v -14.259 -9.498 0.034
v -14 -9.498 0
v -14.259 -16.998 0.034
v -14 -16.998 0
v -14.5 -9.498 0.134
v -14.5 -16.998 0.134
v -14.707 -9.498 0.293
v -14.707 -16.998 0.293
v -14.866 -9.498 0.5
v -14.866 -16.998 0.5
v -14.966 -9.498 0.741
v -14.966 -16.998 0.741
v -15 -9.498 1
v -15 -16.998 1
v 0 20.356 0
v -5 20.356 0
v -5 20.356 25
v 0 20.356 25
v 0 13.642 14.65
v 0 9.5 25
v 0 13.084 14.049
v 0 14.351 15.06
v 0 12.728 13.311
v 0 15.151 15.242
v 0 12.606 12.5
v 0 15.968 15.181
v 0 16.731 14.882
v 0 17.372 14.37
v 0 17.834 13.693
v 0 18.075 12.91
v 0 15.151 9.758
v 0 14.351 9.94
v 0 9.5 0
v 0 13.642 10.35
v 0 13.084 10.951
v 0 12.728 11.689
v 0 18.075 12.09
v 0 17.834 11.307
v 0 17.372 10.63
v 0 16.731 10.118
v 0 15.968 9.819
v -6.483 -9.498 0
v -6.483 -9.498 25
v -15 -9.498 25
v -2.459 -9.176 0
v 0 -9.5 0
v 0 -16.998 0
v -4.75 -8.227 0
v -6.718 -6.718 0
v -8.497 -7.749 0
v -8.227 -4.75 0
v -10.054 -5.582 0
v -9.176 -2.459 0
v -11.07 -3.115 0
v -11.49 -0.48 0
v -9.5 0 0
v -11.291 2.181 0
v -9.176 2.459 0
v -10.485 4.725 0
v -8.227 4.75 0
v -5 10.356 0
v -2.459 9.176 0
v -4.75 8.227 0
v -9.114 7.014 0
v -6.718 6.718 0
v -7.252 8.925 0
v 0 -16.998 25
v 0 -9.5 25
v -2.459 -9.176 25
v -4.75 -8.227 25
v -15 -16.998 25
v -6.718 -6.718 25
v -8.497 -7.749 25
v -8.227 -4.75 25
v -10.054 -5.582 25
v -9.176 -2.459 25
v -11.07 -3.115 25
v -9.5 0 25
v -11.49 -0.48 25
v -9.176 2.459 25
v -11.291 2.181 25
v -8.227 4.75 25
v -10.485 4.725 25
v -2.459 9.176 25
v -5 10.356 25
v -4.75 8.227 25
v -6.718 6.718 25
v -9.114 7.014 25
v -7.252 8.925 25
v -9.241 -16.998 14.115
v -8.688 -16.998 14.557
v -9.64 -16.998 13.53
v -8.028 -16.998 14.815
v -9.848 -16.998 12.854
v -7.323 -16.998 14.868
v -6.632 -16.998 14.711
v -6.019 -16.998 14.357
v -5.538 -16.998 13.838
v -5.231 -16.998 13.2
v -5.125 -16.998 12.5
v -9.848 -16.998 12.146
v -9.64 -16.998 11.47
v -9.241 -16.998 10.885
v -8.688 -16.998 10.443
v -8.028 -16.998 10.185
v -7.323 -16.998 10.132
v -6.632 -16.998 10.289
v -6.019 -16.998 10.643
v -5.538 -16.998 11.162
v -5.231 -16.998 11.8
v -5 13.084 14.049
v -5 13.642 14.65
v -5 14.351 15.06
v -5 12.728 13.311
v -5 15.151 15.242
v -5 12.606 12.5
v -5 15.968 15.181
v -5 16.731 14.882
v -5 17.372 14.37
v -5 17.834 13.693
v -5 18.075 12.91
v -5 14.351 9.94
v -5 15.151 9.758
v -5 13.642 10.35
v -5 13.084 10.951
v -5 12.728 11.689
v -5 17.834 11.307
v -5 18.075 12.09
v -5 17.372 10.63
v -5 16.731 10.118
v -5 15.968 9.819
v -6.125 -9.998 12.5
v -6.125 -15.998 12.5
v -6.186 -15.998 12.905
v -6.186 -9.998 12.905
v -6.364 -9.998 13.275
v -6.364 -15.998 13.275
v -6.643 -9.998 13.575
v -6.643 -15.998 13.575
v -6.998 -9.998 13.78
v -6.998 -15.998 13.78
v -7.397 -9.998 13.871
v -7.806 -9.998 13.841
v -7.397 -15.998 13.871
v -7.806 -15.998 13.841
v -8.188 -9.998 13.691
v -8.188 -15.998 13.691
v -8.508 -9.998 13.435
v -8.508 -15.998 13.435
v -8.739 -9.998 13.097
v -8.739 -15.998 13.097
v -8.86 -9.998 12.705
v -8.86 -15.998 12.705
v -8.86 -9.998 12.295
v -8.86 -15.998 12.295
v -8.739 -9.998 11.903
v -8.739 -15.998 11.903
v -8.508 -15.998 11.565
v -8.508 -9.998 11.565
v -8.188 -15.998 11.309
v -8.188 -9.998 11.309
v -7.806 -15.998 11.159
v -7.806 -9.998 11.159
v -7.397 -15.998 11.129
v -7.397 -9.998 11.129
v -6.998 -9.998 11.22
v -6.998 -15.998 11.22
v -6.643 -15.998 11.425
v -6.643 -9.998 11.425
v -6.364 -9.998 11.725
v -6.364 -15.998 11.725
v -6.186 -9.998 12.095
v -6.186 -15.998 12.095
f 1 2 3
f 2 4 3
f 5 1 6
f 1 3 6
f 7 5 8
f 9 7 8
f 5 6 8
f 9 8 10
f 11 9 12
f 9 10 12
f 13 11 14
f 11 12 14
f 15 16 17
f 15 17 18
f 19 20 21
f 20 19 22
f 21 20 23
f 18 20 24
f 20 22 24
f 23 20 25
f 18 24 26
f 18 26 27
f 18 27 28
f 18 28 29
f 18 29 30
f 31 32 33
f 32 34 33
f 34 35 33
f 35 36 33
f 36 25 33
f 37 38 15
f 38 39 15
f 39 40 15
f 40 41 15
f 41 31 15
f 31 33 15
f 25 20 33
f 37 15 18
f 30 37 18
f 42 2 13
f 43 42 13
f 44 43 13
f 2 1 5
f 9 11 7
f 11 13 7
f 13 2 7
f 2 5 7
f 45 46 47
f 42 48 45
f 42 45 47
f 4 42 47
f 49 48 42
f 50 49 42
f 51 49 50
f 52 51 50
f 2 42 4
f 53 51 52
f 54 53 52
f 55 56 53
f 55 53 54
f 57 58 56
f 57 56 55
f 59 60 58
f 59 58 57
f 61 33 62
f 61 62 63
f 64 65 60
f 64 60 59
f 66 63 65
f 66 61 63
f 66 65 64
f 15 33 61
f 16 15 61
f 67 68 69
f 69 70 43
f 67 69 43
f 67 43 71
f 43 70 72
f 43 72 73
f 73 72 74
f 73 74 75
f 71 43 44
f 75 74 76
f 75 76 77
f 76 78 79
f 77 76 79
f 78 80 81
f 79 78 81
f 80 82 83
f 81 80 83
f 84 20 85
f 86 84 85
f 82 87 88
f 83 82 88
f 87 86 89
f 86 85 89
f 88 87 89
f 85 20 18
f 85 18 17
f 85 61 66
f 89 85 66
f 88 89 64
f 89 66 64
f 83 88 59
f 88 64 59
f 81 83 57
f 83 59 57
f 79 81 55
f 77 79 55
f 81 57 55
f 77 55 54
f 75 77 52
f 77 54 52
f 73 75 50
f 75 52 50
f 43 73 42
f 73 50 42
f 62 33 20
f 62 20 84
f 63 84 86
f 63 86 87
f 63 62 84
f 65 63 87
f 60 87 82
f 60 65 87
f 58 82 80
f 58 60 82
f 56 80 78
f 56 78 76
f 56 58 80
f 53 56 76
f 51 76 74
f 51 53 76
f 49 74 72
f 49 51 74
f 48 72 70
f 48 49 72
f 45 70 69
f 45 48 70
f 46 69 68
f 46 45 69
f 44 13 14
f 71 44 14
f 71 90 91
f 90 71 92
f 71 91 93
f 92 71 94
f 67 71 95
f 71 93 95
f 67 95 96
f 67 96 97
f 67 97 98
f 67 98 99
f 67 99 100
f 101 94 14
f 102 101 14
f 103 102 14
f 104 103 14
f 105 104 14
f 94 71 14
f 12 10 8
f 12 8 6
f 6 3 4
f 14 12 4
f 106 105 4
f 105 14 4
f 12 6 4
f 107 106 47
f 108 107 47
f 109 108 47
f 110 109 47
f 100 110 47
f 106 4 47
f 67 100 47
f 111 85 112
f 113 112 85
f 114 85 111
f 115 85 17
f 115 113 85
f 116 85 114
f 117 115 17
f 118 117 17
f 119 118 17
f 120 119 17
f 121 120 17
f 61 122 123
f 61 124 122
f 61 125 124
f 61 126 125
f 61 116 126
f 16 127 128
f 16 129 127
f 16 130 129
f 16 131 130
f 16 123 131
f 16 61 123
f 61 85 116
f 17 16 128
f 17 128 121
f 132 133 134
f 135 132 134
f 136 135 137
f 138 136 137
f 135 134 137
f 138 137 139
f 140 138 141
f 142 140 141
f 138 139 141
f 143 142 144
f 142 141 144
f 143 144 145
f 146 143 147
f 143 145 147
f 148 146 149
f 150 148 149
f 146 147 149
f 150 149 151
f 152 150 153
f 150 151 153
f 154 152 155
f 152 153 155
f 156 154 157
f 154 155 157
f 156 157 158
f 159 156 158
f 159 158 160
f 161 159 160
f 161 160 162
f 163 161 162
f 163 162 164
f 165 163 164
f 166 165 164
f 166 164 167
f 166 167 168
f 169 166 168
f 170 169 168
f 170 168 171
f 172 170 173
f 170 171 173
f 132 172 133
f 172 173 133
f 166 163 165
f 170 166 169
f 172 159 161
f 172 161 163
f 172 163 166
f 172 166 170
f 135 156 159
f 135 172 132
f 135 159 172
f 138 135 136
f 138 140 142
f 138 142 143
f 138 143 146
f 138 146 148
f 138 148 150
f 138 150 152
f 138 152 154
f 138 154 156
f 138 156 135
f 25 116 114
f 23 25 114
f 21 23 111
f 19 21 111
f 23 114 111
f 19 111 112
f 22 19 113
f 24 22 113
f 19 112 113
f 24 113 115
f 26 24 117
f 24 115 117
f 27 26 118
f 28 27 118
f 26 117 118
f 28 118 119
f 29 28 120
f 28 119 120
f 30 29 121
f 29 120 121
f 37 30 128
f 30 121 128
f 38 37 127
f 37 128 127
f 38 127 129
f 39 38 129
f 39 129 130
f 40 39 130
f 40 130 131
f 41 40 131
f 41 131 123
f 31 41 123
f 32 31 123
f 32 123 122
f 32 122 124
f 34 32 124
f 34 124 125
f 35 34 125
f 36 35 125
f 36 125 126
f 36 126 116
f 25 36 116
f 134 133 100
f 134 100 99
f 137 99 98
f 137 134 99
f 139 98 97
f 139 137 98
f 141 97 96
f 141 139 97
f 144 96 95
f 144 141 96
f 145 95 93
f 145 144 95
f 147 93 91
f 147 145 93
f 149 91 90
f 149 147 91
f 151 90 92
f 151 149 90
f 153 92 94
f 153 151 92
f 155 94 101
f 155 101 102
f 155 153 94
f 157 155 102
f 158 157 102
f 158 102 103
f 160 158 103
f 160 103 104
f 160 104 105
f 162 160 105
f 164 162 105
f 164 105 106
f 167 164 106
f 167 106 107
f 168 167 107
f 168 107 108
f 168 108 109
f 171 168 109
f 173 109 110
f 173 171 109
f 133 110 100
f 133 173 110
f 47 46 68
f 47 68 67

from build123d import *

# Parameters (mm, degrees)
PAD004_DEPTH    = 25
SKETCH011_R     = 1.375
POCKET007_DEPTH = 7
SKETCH012_R     = 2.75
POCKET008_DEPTH = 7
FILLET012_R     = 1
CHAMFER001_SIZE = 1


with BuildPart() as part:
    # Sketch008 (on XY_Plane003 of Origin006) → Pad004 (new body)
    with BuildSketch(Plane.XY):
        with BuildLine():
            ThreePointArc((0, 9.5), (-9.5, 0), (0, -9.5))
            Line((0, -9.5), (0, -16.99844))
            Line((-15, -16.99844), (0, -16.99844))
            Line((-15, -9.49844), (-15, -16.99844))
            Line((-6.483027, -9.49844), (-15, -9.49844))
            ThreePointArc((-5, 10.356158), (-11.468053, 0.856599), (-6.483027, -9.49844))
            Line((-5, 10.356158), (-5, 20.356158))
            Line((-5, 20.356158), (0, 20.356158))
            Line((0, 9.5), (0, 20.356158))
        make_face()
    extrude(amount=PAD004_DEPTH)

    # Sketch011 (on Face6 of Pad004) → Pocket007 (cut)
    with BuildSketch(Plane.XZ.offset(16.99844)):
        with Locations((-7.5, 12.5)):
            Circle(SKETCH011_R)
    extrude(amount=-POCKET007_DEPTH, mode=Mode.SUBTRACT)

    # Sketch012 (on Face1 of Pocket007) → Pocket008 (cut)
    with BuildSketch(Plane(origin=(-5, 0, 0), x_dir=(0, -1, 0), z_dir=(-1, 0, 0))):
        with Locations((-15.356158, 12.5)):
            Circle(SKETCH012_R)
    extrude(amount=-POCKET008_DEPTH, mode=Mode.SUBTRACT)

    # Fillet012
    fillet012_edges = [part.edges().sort_by_distance(p)[0] for p in [
        (-15, -13.24844, 0),
    ]]
    fillet(fillet012_edges, radius=FILLET012_R)

    # Chamfer001
    chamfer001_edges = [part.edges().sort_by_distance(p)[0] for p in [
        (-8.875, -16.99844, 12.5),
    ]]
    chamfer(chamfer001_edges, length=CHAMFER001_SIZE)


solid = part.part
